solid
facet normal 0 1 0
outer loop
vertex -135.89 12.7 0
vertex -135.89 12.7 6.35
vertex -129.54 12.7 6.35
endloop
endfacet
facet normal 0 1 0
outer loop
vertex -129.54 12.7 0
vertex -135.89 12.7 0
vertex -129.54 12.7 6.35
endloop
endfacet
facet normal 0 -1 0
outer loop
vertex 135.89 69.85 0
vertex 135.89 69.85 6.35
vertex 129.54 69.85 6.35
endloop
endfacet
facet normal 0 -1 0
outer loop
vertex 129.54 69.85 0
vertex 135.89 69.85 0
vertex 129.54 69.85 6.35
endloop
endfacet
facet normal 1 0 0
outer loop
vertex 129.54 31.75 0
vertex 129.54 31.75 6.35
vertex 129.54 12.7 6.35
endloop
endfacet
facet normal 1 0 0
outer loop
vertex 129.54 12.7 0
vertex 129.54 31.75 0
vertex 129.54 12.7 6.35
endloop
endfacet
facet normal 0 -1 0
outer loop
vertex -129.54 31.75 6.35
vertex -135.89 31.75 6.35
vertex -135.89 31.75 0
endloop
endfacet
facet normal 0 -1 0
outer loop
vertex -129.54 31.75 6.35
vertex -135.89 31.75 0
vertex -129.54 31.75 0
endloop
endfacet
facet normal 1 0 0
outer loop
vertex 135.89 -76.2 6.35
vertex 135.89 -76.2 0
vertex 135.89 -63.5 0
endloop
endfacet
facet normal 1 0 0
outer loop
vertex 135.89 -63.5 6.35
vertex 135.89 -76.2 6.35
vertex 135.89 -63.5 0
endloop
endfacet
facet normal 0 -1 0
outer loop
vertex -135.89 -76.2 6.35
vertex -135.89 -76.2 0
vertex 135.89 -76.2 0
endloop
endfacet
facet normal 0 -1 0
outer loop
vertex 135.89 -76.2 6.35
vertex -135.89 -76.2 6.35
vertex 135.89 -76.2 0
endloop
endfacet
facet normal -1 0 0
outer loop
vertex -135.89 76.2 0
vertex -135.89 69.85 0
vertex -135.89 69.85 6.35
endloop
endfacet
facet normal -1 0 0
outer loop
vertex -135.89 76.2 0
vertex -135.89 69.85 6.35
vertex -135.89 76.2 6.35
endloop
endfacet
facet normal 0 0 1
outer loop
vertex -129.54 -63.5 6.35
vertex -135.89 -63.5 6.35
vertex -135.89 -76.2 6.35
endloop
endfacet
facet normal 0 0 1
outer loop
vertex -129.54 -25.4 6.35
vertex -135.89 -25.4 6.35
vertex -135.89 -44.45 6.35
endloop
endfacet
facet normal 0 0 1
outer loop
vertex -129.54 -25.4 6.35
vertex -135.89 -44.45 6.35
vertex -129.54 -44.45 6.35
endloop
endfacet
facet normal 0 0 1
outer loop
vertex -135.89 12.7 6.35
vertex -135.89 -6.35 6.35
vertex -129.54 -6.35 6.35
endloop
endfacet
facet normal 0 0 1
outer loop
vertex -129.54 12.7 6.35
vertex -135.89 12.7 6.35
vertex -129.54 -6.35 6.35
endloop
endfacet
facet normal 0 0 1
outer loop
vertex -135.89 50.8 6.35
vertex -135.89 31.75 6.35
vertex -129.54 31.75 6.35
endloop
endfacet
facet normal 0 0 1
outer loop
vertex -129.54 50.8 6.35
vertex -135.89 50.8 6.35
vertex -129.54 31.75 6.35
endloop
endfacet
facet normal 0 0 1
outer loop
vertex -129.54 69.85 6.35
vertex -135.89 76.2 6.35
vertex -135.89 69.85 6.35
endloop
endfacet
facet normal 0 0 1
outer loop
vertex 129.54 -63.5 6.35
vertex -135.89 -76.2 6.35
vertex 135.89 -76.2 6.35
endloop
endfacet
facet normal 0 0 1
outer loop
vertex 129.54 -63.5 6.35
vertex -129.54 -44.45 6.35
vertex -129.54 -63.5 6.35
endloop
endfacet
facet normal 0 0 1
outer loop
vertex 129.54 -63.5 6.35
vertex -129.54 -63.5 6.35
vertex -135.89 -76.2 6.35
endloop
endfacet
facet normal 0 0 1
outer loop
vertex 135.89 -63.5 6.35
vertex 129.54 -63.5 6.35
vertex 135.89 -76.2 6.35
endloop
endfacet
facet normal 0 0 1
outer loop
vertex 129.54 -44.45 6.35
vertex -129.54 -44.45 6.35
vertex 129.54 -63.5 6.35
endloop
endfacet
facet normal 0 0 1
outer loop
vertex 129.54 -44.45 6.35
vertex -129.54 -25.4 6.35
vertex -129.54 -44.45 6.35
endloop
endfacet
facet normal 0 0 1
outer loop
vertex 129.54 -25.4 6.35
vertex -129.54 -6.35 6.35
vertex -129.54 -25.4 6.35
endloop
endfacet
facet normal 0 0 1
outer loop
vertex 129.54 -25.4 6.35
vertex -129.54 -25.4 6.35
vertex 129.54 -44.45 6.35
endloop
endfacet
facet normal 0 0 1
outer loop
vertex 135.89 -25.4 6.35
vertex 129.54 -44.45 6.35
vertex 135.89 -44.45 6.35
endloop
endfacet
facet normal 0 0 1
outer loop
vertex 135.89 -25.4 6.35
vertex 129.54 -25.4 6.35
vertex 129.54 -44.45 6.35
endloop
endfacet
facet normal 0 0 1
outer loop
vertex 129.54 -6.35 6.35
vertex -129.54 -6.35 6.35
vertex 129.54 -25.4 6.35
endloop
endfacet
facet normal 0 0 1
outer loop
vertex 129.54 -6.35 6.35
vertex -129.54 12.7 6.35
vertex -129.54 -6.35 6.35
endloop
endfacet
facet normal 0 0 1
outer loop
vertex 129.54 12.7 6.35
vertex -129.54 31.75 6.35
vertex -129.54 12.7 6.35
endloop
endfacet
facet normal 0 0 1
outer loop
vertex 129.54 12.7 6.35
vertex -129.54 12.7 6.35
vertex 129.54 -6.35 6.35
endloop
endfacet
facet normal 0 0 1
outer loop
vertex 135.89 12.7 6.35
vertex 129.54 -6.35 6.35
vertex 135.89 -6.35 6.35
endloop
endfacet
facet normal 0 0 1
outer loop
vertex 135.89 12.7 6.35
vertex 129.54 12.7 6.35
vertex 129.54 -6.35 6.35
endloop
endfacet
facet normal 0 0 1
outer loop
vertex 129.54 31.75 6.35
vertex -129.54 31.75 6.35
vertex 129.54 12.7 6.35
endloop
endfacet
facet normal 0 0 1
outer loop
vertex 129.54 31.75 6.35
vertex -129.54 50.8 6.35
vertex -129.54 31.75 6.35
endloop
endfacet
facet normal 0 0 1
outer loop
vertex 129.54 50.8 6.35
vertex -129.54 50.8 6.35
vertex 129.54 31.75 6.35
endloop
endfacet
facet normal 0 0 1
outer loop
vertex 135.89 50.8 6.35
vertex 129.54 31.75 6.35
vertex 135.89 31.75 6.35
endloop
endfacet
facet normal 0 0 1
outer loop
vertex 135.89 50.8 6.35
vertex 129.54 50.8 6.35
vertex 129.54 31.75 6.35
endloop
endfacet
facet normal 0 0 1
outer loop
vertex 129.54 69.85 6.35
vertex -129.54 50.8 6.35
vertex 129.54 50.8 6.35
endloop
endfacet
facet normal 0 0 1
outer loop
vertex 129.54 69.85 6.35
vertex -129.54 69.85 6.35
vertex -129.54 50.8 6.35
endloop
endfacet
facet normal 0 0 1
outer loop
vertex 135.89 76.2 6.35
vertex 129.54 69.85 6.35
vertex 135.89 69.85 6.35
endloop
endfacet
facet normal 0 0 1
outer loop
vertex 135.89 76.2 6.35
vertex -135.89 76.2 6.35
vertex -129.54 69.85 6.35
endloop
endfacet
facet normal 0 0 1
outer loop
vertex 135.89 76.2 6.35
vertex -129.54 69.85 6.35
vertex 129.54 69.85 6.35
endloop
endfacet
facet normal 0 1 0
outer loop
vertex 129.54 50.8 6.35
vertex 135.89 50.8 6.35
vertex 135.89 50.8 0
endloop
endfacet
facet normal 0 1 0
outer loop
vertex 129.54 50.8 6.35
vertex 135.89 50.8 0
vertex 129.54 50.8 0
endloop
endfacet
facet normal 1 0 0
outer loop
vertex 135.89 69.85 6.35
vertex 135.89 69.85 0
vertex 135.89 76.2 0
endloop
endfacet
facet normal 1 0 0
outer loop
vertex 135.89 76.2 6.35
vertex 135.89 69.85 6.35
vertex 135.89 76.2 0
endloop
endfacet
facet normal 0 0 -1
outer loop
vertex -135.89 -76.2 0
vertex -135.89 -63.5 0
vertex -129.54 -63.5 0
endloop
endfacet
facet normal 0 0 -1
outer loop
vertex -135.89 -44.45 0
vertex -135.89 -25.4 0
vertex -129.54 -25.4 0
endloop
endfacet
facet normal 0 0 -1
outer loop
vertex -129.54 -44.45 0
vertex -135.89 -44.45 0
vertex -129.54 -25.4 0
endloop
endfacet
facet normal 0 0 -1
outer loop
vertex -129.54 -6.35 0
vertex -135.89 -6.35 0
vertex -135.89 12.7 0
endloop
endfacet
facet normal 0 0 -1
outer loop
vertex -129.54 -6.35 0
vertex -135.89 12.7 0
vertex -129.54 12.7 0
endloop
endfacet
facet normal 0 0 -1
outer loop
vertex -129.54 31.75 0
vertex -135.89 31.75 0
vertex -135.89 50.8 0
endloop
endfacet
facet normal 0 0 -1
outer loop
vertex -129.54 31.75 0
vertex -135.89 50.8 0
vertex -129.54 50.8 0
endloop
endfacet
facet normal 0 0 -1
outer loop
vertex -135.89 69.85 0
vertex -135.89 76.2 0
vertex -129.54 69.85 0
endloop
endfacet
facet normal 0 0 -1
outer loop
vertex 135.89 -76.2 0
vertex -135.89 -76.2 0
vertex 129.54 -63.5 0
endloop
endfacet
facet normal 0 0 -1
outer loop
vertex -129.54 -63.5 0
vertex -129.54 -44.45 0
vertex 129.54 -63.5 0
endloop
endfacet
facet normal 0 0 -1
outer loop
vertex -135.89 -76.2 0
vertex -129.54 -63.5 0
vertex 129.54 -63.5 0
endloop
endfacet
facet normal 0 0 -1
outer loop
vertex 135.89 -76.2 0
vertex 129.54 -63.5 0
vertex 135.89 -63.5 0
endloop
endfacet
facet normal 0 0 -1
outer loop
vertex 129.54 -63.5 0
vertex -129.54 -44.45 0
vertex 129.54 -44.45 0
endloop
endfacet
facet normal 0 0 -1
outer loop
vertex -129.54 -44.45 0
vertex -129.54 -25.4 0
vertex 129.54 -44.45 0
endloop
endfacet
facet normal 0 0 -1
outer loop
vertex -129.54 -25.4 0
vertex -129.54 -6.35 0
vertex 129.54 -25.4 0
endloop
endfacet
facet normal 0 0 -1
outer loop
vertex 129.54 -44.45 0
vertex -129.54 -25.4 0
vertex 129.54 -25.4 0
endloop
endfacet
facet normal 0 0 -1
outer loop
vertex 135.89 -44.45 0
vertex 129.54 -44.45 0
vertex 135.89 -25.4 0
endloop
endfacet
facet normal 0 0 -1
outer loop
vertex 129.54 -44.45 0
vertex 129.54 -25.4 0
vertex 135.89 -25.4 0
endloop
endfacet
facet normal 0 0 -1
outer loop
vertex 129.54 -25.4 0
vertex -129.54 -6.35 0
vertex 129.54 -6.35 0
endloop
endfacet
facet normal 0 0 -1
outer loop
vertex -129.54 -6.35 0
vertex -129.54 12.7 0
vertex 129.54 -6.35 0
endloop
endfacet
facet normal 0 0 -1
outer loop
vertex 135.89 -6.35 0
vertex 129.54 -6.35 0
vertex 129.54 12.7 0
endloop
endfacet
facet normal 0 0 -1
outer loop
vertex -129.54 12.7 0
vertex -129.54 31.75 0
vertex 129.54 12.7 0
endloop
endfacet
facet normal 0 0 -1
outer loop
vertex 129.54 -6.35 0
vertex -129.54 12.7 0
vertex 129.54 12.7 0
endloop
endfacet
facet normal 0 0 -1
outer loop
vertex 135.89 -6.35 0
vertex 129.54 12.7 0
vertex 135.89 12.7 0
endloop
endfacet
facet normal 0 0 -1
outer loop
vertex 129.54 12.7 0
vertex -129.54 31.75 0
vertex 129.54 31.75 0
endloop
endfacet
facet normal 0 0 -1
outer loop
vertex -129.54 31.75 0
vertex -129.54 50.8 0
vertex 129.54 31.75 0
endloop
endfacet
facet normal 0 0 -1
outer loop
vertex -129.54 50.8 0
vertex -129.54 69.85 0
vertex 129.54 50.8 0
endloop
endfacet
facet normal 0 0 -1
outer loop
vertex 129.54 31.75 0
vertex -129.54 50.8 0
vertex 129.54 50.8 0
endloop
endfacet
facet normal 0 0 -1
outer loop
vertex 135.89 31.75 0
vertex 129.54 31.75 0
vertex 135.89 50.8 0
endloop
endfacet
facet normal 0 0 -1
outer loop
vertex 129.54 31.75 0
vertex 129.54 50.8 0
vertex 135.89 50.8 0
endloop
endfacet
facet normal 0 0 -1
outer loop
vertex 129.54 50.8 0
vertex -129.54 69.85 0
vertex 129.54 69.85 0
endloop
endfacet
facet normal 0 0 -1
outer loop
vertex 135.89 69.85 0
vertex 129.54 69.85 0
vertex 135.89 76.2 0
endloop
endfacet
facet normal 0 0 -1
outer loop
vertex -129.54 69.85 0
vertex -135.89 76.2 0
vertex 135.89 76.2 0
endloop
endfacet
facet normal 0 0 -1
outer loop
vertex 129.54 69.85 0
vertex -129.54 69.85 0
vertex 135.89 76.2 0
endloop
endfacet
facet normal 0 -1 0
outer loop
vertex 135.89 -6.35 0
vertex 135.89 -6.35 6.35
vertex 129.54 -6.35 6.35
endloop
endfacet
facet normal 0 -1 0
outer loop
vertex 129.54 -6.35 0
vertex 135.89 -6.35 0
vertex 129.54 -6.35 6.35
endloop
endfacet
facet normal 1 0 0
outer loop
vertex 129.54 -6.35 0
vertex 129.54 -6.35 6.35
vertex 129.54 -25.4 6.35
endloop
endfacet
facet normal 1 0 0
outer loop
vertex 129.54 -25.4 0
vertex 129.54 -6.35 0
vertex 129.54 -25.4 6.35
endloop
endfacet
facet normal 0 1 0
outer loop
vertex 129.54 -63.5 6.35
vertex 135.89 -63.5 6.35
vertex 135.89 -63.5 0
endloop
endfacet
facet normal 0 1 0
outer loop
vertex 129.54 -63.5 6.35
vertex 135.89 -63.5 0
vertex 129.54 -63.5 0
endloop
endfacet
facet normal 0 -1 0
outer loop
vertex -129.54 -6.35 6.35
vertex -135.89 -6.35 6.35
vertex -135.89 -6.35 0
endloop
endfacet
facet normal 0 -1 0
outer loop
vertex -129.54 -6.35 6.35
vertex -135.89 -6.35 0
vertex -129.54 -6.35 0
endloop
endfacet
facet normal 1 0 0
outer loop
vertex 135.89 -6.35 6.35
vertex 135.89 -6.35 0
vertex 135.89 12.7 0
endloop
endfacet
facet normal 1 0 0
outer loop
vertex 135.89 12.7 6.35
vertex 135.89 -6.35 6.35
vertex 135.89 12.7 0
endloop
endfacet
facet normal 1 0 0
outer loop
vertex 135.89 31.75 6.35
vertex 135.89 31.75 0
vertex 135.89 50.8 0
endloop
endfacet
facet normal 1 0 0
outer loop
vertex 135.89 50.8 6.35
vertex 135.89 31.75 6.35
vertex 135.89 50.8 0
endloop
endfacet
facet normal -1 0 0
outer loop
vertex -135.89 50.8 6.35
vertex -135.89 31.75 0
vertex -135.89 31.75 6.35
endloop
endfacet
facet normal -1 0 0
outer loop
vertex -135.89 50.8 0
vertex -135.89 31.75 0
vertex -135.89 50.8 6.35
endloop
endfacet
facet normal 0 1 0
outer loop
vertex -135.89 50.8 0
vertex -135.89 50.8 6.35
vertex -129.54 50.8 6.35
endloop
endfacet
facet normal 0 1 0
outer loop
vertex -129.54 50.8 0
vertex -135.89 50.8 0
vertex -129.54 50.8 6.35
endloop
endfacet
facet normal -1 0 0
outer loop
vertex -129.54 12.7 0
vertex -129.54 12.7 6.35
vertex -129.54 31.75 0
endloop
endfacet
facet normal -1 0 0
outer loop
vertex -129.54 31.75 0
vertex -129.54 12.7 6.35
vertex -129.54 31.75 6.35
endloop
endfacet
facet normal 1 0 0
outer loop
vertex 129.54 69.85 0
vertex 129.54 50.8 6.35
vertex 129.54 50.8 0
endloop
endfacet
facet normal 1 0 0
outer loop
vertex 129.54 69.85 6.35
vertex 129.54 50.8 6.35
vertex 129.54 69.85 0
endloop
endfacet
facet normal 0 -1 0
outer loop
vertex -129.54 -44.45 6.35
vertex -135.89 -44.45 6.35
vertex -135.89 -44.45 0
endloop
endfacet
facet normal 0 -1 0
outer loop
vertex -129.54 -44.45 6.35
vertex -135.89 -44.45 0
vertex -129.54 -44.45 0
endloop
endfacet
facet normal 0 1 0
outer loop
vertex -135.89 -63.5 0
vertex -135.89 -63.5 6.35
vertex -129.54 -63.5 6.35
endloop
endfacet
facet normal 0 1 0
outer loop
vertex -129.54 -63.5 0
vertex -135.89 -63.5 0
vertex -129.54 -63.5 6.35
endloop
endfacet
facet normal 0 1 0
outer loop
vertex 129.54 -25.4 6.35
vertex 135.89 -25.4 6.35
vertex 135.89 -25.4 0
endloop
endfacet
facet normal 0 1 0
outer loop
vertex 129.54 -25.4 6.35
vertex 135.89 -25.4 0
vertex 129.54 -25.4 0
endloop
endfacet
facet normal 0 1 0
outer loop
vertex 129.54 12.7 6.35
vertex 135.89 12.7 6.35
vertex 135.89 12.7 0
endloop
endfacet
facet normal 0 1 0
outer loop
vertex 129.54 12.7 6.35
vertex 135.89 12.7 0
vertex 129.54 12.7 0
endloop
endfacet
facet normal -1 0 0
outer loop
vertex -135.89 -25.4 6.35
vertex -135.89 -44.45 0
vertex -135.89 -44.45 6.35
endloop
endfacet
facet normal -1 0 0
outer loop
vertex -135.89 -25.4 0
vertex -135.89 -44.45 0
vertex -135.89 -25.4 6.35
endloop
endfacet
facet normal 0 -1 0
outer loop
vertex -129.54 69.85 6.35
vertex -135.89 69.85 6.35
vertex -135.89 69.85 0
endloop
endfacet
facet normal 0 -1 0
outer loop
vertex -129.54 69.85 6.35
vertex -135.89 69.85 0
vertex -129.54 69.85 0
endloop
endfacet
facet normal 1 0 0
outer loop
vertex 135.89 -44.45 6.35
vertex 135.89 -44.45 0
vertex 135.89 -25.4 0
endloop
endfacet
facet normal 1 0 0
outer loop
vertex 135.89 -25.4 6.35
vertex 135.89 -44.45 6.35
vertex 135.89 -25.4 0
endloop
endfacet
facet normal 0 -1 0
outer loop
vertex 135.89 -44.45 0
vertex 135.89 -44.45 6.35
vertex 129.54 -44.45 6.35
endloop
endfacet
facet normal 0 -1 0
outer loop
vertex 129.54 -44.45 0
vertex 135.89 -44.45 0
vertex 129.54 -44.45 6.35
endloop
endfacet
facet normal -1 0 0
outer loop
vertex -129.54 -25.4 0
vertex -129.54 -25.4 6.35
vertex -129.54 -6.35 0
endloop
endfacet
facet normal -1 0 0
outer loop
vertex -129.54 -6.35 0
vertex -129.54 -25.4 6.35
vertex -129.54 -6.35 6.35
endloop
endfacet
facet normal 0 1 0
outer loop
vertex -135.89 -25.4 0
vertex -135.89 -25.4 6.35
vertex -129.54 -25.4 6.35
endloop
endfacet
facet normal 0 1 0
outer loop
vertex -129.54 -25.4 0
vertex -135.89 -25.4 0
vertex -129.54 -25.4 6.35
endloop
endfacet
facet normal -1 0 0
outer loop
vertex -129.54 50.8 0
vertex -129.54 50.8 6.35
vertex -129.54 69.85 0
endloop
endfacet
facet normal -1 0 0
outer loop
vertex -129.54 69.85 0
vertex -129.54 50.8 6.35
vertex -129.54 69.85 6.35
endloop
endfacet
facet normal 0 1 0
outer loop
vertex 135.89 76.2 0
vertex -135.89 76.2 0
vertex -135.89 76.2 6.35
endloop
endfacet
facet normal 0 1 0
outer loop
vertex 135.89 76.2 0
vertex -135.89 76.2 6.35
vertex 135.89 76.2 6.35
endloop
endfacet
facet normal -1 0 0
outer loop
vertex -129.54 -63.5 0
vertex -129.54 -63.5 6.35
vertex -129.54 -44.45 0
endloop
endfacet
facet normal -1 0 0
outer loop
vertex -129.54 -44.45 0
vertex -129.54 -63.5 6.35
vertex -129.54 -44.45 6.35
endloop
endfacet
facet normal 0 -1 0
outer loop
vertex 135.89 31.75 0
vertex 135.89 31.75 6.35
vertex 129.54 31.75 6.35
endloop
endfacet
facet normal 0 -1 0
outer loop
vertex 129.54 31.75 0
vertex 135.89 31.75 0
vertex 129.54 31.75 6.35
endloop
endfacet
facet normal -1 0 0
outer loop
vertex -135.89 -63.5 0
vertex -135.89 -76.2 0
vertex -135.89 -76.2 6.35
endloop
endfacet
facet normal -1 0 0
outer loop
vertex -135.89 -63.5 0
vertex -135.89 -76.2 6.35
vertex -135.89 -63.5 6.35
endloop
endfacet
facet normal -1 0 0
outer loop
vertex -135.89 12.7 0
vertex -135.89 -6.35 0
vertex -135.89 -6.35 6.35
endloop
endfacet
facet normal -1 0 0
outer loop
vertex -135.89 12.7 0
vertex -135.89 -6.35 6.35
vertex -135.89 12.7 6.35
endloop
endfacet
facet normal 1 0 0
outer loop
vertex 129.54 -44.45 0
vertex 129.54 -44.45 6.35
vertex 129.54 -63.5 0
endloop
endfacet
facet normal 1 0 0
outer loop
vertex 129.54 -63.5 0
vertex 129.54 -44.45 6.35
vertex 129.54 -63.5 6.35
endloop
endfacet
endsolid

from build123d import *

# Parameters (mm, degrees)
SKETCH1_W               = 271.78
SKETCH1_H               = 152.4
BOSS_EXTRUDE1_DEPTH     = 6.35
SKETCH2_W               = 6.35
SKETCH2_H               = 19.05
CUT_EXTRUDE1_DEPTH      = 156.925798379
LPATTERN1_COUNT         = 4
LPATTERN1_PITCH         = 38.1
MIRROR1_COPY_1_SKETCH_W = 6.35
MIRROR1_COPY_1_SKETCH_H = 19.05
MIRROR1_COPY_1_DEPTH    = 156.925798379
MIRROR1_COPY_2_SKETCH_W = 6.35
MIRROR1_COPY_2_SKETCH_H = 19.05
MIRROR1_COPY_2_DEPTH    = 156.925798379
MIRROR1_COPY_3_SKETCH_W = 6.35
MIRROR1_COPY_3_SKETCH_H = 19.05
MIRROR1_COPY_3_DEPTH    = 156.925798379


with BuildPart() as part:
    # Sketch1 → Boss-Extrude1 (new body)
    with BuildSketch(Plane.XY):
        Rectangle(SKETCH1_W, SKETCH1_H)
    extrude(amount=BOSS_EXTRUDE1_DEPTH)

    # Sketch2 → Cut-Extrude1 (cut, through all)
    with BuildSketch(Plane.XY.offset(6.35)):
        with Locations((-132.715, 60.325)):
            Rectangle(SKETCH2_W, SKETCH2_H)
    cut_extrude1 = extrude(amount=-CUT_EXTRUDE1_DEPTH, mode=Mode.SUBTRACT)

    # LPattern1: Cut-Extrude1 ×4
    with Locations(*[(0, -i * LPATTERN1_PITCH, 0) for i in range(1, LPATTERN1_COUNT)]):
        add(cut_extrude1, mode=Mode.SUBTRACT)

    # Mirror1: Cut-Extrude1 across plane
    add(cut_extrude1.mirror(Plane(origin=(0, 0, 0), x_dir=(0, 0, 1), z_dir=(1, 0, 0))), mode=Mode.SUBTRACT)

    # Mirror1 copy 1 sketch → Mirror1 copy 1 (cut, through all)
    with BuildSketch(Plane(origin=(0, -38.1, 6.35), x_dir=(-1, 0, 0), z_dir=(0, 0, 1))):
        with Locations((-132.715, -60.325)):
            Rectangle(MIRROR1_COPY_1_SKETCH_W, MIRROR1_COPY_1_SKETCH_H)
    extrude(amount=-MIRROR1_COPY_1_DEPTH, mode=Mode.SUBTRACT)

    # Mirror1 copy 2 sketch → Mirror1 copy 2 (cut, through all)
    with BuildSketch(Plane(origin=(0, -76.2, 6.35), x_dir=(-1, 0, 0), z_dir=(0, 0, 1))):
        with Locations((-132.715, -60.325)):
            Rectangle(MIRROR1_COPY_2_SKETCH_W, MIRROR1_COPY_2_SKETCH_H)
    extrude(amount=-MIRROR1_COPY_2_DEPTH, mode=Mode.SUBTRACT)

    # Mirror1 copy 3 sketch → Mirror1 copy 3 (cut, through all)
    with BuildSketch(Plane(origin=(0, -114.3, 6.35), x_dir=(-1, 0, 0), z_dir=(0, 0, 1))):
        with Locations((-132.715, -60.325)):
            Rectangle(MIRROR1_COPY_3_SKETCH_W, MIRROR1_COPY_3_SKETCH_H)
    extrude(amount=-MIRROR1_COPY_3_DEPTH, mode=Mode.SUBTRACT)


solid = part.part
